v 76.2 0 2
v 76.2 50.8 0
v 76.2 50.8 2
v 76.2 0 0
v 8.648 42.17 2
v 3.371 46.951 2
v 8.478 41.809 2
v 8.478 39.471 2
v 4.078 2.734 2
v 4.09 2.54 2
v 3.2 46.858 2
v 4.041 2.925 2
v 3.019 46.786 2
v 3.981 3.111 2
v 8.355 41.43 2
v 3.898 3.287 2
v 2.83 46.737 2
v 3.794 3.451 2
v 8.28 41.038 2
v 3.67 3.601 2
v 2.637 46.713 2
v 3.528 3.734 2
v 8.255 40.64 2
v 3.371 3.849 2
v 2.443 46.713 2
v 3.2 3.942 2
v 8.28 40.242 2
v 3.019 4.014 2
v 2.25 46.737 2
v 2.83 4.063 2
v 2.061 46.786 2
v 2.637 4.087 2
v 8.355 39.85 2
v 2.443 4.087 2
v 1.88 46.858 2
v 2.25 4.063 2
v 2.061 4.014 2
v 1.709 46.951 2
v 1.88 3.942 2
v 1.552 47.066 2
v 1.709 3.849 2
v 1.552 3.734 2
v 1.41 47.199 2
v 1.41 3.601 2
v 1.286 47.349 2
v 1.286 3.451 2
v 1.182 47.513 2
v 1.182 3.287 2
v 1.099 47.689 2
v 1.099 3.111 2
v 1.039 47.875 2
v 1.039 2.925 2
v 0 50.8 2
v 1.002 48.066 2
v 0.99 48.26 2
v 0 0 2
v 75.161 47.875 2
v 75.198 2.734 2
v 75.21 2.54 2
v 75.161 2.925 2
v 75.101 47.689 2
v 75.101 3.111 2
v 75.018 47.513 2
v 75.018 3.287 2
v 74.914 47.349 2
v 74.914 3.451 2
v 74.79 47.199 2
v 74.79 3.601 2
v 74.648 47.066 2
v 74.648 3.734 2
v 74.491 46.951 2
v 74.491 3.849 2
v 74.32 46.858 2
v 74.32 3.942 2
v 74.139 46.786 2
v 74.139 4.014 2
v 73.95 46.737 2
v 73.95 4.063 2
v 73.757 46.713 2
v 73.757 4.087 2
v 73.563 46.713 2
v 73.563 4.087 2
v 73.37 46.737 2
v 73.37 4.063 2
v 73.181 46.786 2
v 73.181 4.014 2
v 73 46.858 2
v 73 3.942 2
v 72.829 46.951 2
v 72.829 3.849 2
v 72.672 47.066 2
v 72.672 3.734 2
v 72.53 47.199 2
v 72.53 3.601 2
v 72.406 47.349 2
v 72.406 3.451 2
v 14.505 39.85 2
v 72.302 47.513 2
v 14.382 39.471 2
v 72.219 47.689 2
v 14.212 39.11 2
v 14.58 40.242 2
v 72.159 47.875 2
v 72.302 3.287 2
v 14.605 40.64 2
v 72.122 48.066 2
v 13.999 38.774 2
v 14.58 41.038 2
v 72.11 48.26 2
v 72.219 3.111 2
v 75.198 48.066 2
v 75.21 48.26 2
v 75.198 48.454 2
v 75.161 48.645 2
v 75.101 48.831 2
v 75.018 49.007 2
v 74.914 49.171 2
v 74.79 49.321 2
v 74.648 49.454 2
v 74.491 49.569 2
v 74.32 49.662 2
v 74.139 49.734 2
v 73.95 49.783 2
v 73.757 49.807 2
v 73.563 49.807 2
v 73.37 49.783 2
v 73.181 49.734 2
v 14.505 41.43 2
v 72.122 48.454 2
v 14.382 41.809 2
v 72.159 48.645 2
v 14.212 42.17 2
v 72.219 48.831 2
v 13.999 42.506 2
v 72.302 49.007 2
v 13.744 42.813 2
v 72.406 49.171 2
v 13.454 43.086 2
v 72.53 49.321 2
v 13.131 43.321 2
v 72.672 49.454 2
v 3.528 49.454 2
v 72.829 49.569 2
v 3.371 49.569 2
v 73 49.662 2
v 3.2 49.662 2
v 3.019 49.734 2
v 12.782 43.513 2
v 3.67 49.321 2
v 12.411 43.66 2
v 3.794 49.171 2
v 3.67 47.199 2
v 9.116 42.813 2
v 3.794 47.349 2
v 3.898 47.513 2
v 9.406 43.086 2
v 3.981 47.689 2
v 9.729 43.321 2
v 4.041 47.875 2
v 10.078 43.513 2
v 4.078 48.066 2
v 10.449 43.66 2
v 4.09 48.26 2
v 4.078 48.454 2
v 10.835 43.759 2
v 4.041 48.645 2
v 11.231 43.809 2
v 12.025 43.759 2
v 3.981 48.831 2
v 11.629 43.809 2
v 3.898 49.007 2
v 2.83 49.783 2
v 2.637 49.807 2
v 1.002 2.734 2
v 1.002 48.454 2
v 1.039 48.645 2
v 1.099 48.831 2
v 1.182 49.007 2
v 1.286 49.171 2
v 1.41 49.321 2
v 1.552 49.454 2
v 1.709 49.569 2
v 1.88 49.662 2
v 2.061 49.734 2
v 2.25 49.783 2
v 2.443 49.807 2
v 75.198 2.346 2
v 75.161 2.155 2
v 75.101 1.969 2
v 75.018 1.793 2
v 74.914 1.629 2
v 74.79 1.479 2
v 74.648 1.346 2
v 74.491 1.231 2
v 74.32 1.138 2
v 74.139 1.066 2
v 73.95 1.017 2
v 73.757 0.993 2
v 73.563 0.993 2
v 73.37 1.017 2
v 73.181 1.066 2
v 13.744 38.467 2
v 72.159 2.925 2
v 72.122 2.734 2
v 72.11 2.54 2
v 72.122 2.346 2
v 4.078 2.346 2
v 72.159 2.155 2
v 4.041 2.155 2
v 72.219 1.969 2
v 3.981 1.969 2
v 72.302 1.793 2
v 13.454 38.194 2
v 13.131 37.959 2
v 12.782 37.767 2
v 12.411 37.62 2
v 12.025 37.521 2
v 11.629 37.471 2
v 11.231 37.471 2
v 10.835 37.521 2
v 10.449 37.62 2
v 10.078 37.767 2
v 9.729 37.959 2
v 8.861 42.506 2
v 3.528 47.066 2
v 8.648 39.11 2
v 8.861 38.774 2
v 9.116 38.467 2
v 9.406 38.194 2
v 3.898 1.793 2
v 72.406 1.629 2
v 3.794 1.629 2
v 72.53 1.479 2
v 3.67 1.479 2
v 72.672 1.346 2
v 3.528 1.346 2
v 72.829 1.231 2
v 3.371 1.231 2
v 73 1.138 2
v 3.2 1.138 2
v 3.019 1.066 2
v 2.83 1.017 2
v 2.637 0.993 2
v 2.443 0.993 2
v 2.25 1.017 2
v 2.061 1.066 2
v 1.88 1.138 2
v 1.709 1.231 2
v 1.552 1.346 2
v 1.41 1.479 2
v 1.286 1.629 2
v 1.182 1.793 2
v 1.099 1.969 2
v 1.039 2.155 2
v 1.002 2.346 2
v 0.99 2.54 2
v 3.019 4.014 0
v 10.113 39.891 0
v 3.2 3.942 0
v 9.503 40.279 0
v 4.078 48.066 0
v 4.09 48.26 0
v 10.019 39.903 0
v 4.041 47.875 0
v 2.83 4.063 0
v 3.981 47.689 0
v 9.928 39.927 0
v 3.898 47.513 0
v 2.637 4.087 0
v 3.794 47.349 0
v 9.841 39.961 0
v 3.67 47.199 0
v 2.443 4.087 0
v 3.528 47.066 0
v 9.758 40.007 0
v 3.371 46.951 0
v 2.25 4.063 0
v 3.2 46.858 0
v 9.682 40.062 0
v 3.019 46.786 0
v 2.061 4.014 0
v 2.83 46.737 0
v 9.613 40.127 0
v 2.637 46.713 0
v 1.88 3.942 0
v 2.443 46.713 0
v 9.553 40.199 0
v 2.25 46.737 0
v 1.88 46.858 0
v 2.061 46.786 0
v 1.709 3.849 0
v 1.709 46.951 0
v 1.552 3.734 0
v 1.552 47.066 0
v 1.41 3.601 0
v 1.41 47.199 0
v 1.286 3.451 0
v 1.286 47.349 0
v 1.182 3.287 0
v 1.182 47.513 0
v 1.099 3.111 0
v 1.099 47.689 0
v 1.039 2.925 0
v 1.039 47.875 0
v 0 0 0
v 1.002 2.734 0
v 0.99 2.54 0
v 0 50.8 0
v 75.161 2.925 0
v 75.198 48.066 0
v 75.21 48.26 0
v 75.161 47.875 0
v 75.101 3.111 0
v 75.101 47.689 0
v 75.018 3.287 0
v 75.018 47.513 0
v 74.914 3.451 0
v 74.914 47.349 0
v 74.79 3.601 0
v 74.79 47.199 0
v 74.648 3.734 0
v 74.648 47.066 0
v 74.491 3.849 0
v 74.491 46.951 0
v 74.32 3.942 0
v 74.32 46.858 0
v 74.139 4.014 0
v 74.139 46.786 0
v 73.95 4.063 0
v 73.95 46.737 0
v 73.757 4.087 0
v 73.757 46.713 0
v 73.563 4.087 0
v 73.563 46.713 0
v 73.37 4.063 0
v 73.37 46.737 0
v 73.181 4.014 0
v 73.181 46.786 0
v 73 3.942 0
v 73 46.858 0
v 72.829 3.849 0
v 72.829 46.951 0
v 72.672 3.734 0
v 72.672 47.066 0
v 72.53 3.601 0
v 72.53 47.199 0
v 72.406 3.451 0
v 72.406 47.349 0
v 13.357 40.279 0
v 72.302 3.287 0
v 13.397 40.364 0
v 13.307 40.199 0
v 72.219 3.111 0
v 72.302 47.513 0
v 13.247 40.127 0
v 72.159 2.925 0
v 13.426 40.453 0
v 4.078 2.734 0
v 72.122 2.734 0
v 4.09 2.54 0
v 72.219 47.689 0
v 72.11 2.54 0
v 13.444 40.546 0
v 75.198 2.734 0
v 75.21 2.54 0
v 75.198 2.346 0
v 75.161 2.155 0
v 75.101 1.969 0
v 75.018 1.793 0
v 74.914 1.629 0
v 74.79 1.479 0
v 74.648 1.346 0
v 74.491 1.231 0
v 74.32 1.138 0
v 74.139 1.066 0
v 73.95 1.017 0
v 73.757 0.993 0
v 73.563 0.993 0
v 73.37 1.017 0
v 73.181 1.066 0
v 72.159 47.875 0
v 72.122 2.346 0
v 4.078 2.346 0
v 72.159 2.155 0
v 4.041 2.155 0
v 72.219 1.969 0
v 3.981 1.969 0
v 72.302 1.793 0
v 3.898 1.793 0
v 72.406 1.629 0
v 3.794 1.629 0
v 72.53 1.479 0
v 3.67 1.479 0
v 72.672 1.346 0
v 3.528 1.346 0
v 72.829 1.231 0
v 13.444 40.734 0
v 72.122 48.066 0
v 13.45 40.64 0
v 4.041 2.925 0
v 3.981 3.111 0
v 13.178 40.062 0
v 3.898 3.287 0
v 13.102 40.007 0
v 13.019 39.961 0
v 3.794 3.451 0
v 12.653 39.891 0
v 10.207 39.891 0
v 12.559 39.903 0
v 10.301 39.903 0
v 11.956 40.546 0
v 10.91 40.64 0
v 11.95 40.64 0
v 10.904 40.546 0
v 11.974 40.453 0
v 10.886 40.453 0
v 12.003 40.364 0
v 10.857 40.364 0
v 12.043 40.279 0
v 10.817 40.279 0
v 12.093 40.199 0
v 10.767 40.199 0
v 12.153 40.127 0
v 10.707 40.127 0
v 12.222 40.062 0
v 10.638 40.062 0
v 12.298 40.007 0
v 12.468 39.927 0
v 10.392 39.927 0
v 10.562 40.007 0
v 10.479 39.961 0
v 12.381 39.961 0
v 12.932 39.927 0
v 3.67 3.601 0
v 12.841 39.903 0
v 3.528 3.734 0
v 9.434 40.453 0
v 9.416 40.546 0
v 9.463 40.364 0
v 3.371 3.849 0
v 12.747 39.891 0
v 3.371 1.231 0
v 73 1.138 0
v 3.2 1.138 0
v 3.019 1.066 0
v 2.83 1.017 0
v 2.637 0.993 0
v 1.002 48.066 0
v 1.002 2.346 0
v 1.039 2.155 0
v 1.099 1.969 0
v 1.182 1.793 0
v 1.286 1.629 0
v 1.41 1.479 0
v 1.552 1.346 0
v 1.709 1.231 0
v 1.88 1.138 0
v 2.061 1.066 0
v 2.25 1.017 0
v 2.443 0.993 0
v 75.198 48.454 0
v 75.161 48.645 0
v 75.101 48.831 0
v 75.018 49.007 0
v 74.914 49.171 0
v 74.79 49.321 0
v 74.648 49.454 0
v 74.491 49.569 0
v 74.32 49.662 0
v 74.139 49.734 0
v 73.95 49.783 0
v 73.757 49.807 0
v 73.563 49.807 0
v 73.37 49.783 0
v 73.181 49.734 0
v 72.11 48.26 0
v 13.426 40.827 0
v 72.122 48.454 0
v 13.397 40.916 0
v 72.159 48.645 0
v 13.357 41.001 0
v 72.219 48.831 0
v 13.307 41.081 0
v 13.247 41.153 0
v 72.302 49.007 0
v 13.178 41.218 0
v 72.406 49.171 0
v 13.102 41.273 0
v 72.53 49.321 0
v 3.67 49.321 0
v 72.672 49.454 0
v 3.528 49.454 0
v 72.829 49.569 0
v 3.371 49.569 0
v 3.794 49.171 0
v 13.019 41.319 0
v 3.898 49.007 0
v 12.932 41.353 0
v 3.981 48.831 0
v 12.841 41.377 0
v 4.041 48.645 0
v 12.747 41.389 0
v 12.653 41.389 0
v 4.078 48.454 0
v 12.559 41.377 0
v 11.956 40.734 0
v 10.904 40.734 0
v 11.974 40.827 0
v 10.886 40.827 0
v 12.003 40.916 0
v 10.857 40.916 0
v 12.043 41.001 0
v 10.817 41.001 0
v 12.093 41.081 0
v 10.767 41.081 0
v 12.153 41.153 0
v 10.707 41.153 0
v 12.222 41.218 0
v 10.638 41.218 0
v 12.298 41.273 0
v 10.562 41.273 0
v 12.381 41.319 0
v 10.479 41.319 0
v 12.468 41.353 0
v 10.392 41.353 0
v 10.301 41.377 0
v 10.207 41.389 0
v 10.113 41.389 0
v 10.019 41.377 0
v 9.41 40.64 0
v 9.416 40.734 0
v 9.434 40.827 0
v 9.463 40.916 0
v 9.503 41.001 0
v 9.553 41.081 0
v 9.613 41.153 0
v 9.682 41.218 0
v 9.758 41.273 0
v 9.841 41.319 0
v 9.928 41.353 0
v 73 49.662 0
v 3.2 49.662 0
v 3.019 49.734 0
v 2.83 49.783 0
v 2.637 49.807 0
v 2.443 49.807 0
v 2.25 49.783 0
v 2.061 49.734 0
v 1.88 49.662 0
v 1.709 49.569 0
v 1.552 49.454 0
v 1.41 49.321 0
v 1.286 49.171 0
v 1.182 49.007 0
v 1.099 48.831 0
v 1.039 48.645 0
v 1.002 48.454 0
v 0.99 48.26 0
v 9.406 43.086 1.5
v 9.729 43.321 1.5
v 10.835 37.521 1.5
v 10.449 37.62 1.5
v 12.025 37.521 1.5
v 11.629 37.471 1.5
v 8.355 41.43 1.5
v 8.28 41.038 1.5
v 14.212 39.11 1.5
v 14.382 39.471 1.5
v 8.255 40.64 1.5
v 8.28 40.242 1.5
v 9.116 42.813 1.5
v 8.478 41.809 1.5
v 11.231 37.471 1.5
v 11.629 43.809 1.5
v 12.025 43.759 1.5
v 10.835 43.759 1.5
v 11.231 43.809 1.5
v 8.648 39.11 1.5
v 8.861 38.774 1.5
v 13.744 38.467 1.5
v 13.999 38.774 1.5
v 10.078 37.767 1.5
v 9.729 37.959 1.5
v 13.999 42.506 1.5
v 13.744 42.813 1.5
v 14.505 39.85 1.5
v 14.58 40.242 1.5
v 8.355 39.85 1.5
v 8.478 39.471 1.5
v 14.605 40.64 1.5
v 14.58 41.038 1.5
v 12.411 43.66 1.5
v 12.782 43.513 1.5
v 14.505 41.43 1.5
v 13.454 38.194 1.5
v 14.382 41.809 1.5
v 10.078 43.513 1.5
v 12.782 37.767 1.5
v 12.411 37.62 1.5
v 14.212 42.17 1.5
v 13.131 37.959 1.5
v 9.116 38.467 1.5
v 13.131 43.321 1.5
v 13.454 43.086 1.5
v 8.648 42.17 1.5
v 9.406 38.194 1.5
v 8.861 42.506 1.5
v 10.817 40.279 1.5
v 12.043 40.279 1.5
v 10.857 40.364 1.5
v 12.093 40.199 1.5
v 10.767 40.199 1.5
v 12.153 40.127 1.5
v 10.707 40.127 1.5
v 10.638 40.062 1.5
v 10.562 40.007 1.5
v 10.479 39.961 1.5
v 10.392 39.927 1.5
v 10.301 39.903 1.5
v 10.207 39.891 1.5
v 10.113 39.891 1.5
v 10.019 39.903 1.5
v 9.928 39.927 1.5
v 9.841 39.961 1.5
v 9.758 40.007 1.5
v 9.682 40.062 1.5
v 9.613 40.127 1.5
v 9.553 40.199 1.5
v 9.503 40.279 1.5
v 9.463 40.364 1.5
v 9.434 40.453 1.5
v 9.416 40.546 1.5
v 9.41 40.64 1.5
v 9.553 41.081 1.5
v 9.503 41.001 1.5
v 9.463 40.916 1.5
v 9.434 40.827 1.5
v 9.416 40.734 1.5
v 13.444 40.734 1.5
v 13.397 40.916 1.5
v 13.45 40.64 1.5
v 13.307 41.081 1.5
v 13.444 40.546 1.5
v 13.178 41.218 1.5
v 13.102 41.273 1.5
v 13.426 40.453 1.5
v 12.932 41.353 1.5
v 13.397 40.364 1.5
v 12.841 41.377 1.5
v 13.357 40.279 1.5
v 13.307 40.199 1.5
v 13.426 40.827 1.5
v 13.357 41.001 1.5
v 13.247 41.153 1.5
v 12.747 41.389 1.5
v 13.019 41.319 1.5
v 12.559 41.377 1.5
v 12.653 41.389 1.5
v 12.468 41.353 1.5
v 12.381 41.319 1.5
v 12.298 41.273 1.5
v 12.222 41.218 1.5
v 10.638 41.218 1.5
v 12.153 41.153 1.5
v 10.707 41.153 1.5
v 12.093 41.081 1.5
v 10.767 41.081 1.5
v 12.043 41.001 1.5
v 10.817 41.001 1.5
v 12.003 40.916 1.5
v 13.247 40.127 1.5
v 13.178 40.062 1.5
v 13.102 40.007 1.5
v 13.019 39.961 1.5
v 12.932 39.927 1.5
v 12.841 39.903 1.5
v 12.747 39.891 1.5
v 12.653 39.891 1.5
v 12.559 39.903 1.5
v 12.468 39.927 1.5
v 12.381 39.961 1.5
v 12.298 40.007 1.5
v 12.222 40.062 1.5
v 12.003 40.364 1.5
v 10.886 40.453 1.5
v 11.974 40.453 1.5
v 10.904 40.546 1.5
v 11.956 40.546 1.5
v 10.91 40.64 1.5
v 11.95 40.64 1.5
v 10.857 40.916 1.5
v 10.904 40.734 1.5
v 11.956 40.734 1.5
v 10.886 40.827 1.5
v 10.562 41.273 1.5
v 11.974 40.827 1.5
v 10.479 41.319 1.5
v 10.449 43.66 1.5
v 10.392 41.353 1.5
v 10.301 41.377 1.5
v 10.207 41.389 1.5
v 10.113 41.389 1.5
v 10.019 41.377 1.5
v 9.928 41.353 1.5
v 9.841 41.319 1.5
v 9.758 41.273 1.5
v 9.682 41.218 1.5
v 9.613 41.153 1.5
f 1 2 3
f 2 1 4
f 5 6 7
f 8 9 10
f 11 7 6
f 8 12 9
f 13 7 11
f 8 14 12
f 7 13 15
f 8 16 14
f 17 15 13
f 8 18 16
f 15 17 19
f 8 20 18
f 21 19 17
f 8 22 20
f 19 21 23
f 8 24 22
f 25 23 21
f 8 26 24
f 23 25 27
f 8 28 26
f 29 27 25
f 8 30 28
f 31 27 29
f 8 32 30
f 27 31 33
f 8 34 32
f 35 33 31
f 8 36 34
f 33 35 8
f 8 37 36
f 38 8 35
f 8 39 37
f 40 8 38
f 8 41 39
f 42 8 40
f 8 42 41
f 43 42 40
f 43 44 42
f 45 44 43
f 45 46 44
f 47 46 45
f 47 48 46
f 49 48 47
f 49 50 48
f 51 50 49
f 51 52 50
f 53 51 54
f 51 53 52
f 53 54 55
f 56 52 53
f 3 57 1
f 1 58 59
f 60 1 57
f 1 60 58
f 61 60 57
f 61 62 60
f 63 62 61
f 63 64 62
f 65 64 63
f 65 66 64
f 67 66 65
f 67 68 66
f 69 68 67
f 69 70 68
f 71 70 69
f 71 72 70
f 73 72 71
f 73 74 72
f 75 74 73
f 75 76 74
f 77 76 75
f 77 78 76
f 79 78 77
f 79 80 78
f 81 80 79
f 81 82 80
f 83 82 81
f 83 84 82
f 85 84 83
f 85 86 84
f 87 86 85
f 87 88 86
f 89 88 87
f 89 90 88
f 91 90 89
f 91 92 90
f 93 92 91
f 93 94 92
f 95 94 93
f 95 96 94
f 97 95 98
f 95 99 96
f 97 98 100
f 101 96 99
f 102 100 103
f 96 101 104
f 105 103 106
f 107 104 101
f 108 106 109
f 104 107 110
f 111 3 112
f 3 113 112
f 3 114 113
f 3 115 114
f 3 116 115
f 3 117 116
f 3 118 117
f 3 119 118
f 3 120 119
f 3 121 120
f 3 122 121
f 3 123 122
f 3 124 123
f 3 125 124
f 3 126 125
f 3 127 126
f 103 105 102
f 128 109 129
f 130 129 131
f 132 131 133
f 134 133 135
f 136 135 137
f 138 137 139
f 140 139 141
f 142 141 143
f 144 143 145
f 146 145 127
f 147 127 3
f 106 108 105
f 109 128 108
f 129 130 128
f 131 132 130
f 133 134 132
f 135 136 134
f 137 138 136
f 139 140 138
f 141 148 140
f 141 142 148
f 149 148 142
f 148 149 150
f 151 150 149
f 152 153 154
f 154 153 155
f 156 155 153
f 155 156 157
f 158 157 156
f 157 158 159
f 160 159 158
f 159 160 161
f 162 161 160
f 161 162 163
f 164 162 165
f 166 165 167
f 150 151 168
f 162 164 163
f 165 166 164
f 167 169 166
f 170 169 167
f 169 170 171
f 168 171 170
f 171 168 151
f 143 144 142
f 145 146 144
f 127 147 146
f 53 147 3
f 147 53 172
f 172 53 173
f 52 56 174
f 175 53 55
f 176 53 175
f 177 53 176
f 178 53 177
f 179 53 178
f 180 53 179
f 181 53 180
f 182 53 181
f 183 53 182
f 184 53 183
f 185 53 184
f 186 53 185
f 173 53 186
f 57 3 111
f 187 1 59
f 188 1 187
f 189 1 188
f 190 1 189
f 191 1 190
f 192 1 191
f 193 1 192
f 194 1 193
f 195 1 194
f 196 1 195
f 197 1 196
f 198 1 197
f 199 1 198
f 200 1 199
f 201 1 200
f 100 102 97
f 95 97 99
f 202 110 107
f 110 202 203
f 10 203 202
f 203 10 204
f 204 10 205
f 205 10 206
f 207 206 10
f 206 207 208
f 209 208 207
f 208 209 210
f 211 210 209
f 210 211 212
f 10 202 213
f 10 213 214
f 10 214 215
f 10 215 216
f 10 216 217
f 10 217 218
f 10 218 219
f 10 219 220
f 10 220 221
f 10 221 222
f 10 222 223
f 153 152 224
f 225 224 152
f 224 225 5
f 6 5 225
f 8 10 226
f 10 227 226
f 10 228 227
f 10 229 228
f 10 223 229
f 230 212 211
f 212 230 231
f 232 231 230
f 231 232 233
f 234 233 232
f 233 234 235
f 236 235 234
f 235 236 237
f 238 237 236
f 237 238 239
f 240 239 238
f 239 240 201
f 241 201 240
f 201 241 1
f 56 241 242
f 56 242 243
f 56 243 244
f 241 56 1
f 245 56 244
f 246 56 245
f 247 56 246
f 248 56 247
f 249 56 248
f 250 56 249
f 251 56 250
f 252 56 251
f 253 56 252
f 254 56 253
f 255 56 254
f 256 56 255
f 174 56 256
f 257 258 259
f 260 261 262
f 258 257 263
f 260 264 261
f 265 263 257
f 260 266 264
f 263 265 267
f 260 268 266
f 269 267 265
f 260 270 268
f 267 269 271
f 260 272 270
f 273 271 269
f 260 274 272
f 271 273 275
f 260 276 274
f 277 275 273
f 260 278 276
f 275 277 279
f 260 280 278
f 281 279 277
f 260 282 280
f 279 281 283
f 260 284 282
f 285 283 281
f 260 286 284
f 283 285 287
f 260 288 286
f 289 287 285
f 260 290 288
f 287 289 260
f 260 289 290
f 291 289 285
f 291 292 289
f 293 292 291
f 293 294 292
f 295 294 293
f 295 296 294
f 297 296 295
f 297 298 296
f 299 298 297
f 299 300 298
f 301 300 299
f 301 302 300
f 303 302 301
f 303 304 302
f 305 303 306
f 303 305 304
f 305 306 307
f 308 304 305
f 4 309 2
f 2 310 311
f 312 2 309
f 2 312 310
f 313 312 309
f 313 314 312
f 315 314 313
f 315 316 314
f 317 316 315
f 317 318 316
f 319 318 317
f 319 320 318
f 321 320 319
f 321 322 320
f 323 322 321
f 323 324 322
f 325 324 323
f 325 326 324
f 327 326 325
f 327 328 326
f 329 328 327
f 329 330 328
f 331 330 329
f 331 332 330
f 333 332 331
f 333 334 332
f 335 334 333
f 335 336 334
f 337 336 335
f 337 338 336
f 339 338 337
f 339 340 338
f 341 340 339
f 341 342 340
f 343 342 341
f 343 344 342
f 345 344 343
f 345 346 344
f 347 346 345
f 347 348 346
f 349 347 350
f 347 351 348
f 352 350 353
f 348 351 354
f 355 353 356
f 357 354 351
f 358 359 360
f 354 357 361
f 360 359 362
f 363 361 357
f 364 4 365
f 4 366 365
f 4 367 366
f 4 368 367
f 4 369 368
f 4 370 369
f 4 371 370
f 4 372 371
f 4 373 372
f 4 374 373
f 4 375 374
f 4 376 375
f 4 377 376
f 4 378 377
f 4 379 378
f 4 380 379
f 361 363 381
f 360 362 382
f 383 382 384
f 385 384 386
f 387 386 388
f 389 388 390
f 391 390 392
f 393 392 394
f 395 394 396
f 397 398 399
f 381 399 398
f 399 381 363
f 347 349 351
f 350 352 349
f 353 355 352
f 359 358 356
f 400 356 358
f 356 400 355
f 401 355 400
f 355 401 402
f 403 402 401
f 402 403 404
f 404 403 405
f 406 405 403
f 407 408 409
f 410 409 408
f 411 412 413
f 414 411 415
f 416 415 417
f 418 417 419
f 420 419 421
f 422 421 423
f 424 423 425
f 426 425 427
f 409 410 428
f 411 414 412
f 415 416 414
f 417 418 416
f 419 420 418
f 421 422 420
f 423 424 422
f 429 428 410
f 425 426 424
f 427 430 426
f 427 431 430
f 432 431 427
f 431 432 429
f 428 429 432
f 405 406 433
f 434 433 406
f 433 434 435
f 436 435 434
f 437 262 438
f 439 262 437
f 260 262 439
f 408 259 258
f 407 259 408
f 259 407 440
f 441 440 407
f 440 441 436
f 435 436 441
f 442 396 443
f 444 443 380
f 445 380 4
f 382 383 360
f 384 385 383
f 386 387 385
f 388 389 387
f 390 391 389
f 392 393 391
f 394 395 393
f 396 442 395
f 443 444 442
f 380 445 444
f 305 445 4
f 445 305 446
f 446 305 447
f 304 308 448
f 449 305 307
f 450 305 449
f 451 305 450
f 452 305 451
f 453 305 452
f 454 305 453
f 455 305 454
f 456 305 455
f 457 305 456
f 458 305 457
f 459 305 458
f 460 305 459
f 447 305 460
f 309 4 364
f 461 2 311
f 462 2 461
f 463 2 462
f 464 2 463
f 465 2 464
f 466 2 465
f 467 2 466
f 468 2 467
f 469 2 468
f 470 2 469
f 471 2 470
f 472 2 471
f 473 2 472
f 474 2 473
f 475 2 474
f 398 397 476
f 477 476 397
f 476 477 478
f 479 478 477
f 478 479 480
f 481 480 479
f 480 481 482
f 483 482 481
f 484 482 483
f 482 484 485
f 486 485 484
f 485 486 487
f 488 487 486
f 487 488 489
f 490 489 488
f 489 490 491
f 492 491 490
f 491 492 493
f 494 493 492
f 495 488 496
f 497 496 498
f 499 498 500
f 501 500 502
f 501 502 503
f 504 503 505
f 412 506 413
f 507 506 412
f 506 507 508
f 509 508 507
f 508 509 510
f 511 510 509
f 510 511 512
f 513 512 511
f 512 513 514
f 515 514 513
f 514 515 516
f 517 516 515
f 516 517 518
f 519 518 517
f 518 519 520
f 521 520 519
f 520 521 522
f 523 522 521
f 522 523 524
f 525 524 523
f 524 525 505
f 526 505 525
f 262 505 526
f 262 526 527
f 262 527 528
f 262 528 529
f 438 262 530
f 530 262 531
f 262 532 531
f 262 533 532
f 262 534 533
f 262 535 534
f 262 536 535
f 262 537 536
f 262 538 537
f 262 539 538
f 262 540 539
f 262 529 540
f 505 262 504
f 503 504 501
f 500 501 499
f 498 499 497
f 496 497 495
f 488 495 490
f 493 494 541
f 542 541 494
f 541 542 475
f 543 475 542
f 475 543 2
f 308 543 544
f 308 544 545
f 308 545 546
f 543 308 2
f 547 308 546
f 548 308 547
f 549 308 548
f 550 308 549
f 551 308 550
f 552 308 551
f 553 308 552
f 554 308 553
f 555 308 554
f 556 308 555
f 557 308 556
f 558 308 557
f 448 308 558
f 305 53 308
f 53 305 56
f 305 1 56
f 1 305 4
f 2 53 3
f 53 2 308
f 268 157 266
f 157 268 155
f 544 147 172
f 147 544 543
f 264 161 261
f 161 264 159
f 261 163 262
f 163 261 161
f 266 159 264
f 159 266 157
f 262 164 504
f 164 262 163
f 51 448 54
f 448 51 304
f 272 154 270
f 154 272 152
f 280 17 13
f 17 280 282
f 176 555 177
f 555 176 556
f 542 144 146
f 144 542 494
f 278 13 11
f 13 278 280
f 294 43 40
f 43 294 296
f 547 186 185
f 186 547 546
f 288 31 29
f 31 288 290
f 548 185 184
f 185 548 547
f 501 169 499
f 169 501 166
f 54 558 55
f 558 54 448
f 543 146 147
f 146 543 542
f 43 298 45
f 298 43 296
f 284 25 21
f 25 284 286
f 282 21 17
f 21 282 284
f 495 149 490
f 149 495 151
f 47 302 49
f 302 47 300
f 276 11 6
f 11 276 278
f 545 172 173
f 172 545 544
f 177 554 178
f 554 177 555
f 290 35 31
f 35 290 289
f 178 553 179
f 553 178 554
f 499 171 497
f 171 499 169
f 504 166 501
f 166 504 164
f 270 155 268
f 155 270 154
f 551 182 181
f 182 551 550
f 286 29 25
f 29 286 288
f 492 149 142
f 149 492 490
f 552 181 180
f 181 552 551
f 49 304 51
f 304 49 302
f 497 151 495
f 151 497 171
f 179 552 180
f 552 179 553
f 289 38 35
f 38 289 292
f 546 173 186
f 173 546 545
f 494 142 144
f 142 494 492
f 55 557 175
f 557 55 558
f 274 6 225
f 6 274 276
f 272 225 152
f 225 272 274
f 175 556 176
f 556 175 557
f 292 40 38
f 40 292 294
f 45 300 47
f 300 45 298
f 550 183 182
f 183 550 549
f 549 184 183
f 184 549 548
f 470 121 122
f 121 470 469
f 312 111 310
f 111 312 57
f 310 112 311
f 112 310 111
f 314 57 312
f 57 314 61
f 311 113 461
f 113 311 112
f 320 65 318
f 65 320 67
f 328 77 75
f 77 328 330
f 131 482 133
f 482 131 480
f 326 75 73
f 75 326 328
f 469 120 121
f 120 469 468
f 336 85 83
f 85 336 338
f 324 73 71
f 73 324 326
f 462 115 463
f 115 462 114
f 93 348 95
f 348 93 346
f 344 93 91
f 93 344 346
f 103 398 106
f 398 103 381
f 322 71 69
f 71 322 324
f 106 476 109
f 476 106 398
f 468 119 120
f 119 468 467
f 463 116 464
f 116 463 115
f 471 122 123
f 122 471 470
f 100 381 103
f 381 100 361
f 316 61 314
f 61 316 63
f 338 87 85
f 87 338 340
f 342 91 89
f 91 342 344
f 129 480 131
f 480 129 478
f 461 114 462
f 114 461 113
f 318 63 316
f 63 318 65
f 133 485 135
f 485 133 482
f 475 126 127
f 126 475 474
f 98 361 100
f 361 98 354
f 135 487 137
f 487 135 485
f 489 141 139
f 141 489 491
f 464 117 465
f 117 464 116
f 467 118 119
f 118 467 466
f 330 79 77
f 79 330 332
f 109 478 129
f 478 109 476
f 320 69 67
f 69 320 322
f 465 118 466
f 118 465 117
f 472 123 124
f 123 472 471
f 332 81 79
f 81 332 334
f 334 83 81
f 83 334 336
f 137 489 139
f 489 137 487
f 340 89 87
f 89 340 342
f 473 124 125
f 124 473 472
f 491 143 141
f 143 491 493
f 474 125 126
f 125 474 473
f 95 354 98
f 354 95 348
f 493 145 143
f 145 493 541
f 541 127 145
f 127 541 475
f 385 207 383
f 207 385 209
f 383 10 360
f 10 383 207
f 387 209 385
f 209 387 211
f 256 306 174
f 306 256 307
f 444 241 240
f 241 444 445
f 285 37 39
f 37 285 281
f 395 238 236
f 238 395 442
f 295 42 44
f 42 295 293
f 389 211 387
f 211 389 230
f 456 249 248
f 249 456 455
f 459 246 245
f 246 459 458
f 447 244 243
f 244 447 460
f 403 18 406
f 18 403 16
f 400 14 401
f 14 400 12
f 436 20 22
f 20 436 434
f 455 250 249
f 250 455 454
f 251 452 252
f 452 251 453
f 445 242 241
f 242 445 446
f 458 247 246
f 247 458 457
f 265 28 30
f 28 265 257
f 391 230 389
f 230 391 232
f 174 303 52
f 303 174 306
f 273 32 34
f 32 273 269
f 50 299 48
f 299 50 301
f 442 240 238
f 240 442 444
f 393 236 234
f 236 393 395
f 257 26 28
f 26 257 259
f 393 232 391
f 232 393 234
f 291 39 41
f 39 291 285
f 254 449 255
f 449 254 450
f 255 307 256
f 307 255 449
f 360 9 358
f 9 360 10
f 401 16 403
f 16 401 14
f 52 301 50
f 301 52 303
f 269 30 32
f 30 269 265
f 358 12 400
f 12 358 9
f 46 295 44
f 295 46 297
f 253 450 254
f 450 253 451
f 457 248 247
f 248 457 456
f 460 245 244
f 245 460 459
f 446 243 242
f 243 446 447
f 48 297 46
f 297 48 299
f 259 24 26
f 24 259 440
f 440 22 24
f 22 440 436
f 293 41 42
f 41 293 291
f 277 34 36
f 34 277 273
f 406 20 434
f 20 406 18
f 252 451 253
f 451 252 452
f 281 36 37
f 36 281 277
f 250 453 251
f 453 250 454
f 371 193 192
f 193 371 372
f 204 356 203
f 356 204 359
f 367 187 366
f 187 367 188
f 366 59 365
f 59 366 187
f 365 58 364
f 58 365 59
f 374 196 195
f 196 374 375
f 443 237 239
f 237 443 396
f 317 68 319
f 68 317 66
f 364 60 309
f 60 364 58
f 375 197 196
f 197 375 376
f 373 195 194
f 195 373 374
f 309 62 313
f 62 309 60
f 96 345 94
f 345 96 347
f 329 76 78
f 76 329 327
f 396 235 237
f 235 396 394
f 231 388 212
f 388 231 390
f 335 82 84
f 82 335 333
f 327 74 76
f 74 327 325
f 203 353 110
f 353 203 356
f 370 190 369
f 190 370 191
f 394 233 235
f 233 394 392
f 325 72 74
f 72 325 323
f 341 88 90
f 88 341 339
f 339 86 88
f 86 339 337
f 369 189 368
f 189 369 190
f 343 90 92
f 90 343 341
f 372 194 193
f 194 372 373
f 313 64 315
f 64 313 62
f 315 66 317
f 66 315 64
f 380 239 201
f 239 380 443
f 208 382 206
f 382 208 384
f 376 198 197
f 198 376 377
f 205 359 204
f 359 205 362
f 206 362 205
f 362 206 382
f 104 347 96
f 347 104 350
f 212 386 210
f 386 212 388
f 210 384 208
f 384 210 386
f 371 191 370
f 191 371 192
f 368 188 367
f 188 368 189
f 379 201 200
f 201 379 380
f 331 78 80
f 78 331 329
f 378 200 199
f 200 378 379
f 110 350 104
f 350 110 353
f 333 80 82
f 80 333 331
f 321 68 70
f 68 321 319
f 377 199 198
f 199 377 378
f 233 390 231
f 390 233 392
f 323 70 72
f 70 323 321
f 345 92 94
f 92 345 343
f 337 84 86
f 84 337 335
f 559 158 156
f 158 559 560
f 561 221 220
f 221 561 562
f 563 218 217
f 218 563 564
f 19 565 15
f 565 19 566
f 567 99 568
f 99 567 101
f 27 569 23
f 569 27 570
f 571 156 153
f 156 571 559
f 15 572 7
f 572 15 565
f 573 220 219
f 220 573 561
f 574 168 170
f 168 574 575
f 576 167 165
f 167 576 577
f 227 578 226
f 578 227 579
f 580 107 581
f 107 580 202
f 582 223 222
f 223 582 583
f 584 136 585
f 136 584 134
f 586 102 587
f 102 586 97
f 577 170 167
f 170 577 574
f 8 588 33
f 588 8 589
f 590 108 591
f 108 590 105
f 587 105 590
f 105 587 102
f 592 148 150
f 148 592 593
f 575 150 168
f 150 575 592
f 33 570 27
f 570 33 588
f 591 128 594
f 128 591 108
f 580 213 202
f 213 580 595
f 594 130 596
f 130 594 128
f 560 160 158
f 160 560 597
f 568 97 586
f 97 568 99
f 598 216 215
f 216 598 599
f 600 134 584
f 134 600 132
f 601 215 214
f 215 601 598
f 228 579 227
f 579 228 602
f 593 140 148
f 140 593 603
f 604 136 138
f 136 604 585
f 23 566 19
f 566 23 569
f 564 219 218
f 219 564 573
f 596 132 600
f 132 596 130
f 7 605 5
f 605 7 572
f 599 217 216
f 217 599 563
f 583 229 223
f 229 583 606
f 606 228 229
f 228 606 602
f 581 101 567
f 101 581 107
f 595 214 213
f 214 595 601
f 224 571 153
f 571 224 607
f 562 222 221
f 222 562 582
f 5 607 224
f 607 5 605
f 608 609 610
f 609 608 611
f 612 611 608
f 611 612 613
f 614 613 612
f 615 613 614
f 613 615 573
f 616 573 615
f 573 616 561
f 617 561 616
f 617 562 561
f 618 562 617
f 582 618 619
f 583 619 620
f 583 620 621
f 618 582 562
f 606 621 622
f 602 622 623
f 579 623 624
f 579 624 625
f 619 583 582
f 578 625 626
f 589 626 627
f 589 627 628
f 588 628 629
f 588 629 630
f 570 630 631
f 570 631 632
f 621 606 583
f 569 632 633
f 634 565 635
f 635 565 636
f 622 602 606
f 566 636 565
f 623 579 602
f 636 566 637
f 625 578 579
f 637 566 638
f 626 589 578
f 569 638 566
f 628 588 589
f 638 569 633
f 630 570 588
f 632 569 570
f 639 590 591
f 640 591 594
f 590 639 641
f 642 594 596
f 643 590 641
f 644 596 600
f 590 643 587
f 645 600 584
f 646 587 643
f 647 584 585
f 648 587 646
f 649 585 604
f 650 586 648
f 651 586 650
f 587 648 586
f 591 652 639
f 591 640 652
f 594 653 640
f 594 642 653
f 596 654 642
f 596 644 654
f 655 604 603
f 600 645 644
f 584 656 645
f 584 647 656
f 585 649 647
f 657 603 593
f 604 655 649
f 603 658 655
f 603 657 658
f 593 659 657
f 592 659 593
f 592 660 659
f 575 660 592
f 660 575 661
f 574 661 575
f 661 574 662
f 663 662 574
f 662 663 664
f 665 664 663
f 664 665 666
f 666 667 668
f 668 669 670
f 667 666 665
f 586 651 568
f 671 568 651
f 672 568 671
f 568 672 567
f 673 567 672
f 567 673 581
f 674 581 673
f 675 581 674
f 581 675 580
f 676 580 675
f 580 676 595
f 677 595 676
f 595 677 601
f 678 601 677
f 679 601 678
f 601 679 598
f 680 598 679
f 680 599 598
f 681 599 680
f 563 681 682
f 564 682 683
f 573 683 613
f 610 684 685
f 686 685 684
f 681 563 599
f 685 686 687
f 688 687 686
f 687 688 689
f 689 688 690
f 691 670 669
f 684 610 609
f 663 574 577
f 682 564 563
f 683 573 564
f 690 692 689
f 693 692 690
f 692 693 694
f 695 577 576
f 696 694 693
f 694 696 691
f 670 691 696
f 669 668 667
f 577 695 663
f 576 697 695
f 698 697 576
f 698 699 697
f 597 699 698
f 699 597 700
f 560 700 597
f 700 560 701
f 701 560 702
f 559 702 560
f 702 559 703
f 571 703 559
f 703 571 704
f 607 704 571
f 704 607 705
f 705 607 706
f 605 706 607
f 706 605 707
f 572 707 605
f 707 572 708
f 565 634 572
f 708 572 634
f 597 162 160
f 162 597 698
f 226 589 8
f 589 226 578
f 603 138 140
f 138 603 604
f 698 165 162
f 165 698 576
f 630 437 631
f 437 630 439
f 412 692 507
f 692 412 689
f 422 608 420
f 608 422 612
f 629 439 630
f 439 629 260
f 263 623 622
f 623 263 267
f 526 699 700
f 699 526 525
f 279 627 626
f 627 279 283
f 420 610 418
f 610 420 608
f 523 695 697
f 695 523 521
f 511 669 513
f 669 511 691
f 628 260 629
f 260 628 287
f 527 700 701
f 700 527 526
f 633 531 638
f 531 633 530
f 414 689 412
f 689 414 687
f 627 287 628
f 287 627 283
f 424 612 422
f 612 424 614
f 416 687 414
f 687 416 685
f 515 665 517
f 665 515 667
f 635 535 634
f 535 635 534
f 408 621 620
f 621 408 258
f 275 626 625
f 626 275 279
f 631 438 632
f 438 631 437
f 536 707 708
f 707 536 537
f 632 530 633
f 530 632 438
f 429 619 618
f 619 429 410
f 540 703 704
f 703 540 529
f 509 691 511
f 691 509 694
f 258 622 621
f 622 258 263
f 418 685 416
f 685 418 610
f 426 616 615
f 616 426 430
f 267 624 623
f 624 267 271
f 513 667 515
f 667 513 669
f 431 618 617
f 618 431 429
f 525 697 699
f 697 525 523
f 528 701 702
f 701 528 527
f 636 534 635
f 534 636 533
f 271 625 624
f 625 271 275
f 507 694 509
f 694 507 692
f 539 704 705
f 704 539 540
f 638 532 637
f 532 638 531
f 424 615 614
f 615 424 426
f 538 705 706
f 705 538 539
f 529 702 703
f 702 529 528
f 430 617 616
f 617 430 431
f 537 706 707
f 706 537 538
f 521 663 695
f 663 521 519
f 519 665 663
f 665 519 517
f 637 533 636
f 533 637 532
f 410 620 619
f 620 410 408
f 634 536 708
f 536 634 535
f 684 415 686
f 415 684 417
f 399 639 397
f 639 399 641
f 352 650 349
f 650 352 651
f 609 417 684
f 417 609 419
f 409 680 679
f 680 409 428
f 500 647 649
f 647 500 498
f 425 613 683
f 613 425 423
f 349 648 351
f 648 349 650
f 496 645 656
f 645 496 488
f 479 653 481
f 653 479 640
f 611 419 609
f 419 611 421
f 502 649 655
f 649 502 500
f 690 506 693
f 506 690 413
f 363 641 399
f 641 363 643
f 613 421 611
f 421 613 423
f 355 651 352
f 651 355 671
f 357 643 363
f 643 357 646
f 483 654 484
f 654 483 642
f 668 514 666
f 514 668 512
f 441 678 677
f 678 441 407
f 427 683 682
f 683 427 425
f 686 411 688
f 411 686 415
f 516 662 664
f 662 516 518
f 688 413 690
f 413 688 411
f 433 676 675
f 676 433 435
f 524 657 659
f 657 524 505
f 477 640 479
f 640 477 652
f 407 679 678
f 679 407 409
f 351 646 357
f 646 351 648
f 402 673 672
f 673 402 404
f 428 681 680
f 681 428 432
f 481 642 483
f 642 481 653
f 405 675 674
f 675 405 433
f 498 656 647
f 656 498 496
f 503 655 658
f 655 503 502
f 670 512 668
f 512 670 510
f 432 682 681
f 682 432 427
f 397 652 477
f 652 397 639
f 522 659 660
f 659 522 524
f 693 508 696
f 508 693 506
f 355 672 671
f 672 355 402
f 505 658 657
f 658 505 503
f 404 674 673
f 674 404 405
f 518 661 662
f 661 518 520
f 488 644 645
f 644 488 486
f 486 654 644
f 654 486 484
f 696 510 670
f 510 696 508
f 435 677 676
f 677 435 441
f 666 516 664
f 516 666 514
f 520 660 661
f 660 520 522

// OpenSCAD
$fn=50;
translate([0,50.8,0]) mirror([0,1,0]) difference()
{
    cube([76.2,50.8,2]);
    translate([2.54,2.54,-0.1]) cylinder(h=10,d=3.1);
    translate([73.659996,2.54,-0.1]) cylinder(h=10,d=3.1);
    translate([2.54,48.26,-0.1]) cylinder(h=10,d=3.1);
    translate([73.659996,48.26,-0.1]) cylinder(h=10,d=3.1);
    translate([11.43,10.16,1.5]) cylinder(h=10,d=6.35);
    translate([10.16,10.16,-0.1]) cylinder(h=10,d=1.5);
    translate([12.7,10.16,-0.1]) cylinder(h=10,d=1.5);
}
